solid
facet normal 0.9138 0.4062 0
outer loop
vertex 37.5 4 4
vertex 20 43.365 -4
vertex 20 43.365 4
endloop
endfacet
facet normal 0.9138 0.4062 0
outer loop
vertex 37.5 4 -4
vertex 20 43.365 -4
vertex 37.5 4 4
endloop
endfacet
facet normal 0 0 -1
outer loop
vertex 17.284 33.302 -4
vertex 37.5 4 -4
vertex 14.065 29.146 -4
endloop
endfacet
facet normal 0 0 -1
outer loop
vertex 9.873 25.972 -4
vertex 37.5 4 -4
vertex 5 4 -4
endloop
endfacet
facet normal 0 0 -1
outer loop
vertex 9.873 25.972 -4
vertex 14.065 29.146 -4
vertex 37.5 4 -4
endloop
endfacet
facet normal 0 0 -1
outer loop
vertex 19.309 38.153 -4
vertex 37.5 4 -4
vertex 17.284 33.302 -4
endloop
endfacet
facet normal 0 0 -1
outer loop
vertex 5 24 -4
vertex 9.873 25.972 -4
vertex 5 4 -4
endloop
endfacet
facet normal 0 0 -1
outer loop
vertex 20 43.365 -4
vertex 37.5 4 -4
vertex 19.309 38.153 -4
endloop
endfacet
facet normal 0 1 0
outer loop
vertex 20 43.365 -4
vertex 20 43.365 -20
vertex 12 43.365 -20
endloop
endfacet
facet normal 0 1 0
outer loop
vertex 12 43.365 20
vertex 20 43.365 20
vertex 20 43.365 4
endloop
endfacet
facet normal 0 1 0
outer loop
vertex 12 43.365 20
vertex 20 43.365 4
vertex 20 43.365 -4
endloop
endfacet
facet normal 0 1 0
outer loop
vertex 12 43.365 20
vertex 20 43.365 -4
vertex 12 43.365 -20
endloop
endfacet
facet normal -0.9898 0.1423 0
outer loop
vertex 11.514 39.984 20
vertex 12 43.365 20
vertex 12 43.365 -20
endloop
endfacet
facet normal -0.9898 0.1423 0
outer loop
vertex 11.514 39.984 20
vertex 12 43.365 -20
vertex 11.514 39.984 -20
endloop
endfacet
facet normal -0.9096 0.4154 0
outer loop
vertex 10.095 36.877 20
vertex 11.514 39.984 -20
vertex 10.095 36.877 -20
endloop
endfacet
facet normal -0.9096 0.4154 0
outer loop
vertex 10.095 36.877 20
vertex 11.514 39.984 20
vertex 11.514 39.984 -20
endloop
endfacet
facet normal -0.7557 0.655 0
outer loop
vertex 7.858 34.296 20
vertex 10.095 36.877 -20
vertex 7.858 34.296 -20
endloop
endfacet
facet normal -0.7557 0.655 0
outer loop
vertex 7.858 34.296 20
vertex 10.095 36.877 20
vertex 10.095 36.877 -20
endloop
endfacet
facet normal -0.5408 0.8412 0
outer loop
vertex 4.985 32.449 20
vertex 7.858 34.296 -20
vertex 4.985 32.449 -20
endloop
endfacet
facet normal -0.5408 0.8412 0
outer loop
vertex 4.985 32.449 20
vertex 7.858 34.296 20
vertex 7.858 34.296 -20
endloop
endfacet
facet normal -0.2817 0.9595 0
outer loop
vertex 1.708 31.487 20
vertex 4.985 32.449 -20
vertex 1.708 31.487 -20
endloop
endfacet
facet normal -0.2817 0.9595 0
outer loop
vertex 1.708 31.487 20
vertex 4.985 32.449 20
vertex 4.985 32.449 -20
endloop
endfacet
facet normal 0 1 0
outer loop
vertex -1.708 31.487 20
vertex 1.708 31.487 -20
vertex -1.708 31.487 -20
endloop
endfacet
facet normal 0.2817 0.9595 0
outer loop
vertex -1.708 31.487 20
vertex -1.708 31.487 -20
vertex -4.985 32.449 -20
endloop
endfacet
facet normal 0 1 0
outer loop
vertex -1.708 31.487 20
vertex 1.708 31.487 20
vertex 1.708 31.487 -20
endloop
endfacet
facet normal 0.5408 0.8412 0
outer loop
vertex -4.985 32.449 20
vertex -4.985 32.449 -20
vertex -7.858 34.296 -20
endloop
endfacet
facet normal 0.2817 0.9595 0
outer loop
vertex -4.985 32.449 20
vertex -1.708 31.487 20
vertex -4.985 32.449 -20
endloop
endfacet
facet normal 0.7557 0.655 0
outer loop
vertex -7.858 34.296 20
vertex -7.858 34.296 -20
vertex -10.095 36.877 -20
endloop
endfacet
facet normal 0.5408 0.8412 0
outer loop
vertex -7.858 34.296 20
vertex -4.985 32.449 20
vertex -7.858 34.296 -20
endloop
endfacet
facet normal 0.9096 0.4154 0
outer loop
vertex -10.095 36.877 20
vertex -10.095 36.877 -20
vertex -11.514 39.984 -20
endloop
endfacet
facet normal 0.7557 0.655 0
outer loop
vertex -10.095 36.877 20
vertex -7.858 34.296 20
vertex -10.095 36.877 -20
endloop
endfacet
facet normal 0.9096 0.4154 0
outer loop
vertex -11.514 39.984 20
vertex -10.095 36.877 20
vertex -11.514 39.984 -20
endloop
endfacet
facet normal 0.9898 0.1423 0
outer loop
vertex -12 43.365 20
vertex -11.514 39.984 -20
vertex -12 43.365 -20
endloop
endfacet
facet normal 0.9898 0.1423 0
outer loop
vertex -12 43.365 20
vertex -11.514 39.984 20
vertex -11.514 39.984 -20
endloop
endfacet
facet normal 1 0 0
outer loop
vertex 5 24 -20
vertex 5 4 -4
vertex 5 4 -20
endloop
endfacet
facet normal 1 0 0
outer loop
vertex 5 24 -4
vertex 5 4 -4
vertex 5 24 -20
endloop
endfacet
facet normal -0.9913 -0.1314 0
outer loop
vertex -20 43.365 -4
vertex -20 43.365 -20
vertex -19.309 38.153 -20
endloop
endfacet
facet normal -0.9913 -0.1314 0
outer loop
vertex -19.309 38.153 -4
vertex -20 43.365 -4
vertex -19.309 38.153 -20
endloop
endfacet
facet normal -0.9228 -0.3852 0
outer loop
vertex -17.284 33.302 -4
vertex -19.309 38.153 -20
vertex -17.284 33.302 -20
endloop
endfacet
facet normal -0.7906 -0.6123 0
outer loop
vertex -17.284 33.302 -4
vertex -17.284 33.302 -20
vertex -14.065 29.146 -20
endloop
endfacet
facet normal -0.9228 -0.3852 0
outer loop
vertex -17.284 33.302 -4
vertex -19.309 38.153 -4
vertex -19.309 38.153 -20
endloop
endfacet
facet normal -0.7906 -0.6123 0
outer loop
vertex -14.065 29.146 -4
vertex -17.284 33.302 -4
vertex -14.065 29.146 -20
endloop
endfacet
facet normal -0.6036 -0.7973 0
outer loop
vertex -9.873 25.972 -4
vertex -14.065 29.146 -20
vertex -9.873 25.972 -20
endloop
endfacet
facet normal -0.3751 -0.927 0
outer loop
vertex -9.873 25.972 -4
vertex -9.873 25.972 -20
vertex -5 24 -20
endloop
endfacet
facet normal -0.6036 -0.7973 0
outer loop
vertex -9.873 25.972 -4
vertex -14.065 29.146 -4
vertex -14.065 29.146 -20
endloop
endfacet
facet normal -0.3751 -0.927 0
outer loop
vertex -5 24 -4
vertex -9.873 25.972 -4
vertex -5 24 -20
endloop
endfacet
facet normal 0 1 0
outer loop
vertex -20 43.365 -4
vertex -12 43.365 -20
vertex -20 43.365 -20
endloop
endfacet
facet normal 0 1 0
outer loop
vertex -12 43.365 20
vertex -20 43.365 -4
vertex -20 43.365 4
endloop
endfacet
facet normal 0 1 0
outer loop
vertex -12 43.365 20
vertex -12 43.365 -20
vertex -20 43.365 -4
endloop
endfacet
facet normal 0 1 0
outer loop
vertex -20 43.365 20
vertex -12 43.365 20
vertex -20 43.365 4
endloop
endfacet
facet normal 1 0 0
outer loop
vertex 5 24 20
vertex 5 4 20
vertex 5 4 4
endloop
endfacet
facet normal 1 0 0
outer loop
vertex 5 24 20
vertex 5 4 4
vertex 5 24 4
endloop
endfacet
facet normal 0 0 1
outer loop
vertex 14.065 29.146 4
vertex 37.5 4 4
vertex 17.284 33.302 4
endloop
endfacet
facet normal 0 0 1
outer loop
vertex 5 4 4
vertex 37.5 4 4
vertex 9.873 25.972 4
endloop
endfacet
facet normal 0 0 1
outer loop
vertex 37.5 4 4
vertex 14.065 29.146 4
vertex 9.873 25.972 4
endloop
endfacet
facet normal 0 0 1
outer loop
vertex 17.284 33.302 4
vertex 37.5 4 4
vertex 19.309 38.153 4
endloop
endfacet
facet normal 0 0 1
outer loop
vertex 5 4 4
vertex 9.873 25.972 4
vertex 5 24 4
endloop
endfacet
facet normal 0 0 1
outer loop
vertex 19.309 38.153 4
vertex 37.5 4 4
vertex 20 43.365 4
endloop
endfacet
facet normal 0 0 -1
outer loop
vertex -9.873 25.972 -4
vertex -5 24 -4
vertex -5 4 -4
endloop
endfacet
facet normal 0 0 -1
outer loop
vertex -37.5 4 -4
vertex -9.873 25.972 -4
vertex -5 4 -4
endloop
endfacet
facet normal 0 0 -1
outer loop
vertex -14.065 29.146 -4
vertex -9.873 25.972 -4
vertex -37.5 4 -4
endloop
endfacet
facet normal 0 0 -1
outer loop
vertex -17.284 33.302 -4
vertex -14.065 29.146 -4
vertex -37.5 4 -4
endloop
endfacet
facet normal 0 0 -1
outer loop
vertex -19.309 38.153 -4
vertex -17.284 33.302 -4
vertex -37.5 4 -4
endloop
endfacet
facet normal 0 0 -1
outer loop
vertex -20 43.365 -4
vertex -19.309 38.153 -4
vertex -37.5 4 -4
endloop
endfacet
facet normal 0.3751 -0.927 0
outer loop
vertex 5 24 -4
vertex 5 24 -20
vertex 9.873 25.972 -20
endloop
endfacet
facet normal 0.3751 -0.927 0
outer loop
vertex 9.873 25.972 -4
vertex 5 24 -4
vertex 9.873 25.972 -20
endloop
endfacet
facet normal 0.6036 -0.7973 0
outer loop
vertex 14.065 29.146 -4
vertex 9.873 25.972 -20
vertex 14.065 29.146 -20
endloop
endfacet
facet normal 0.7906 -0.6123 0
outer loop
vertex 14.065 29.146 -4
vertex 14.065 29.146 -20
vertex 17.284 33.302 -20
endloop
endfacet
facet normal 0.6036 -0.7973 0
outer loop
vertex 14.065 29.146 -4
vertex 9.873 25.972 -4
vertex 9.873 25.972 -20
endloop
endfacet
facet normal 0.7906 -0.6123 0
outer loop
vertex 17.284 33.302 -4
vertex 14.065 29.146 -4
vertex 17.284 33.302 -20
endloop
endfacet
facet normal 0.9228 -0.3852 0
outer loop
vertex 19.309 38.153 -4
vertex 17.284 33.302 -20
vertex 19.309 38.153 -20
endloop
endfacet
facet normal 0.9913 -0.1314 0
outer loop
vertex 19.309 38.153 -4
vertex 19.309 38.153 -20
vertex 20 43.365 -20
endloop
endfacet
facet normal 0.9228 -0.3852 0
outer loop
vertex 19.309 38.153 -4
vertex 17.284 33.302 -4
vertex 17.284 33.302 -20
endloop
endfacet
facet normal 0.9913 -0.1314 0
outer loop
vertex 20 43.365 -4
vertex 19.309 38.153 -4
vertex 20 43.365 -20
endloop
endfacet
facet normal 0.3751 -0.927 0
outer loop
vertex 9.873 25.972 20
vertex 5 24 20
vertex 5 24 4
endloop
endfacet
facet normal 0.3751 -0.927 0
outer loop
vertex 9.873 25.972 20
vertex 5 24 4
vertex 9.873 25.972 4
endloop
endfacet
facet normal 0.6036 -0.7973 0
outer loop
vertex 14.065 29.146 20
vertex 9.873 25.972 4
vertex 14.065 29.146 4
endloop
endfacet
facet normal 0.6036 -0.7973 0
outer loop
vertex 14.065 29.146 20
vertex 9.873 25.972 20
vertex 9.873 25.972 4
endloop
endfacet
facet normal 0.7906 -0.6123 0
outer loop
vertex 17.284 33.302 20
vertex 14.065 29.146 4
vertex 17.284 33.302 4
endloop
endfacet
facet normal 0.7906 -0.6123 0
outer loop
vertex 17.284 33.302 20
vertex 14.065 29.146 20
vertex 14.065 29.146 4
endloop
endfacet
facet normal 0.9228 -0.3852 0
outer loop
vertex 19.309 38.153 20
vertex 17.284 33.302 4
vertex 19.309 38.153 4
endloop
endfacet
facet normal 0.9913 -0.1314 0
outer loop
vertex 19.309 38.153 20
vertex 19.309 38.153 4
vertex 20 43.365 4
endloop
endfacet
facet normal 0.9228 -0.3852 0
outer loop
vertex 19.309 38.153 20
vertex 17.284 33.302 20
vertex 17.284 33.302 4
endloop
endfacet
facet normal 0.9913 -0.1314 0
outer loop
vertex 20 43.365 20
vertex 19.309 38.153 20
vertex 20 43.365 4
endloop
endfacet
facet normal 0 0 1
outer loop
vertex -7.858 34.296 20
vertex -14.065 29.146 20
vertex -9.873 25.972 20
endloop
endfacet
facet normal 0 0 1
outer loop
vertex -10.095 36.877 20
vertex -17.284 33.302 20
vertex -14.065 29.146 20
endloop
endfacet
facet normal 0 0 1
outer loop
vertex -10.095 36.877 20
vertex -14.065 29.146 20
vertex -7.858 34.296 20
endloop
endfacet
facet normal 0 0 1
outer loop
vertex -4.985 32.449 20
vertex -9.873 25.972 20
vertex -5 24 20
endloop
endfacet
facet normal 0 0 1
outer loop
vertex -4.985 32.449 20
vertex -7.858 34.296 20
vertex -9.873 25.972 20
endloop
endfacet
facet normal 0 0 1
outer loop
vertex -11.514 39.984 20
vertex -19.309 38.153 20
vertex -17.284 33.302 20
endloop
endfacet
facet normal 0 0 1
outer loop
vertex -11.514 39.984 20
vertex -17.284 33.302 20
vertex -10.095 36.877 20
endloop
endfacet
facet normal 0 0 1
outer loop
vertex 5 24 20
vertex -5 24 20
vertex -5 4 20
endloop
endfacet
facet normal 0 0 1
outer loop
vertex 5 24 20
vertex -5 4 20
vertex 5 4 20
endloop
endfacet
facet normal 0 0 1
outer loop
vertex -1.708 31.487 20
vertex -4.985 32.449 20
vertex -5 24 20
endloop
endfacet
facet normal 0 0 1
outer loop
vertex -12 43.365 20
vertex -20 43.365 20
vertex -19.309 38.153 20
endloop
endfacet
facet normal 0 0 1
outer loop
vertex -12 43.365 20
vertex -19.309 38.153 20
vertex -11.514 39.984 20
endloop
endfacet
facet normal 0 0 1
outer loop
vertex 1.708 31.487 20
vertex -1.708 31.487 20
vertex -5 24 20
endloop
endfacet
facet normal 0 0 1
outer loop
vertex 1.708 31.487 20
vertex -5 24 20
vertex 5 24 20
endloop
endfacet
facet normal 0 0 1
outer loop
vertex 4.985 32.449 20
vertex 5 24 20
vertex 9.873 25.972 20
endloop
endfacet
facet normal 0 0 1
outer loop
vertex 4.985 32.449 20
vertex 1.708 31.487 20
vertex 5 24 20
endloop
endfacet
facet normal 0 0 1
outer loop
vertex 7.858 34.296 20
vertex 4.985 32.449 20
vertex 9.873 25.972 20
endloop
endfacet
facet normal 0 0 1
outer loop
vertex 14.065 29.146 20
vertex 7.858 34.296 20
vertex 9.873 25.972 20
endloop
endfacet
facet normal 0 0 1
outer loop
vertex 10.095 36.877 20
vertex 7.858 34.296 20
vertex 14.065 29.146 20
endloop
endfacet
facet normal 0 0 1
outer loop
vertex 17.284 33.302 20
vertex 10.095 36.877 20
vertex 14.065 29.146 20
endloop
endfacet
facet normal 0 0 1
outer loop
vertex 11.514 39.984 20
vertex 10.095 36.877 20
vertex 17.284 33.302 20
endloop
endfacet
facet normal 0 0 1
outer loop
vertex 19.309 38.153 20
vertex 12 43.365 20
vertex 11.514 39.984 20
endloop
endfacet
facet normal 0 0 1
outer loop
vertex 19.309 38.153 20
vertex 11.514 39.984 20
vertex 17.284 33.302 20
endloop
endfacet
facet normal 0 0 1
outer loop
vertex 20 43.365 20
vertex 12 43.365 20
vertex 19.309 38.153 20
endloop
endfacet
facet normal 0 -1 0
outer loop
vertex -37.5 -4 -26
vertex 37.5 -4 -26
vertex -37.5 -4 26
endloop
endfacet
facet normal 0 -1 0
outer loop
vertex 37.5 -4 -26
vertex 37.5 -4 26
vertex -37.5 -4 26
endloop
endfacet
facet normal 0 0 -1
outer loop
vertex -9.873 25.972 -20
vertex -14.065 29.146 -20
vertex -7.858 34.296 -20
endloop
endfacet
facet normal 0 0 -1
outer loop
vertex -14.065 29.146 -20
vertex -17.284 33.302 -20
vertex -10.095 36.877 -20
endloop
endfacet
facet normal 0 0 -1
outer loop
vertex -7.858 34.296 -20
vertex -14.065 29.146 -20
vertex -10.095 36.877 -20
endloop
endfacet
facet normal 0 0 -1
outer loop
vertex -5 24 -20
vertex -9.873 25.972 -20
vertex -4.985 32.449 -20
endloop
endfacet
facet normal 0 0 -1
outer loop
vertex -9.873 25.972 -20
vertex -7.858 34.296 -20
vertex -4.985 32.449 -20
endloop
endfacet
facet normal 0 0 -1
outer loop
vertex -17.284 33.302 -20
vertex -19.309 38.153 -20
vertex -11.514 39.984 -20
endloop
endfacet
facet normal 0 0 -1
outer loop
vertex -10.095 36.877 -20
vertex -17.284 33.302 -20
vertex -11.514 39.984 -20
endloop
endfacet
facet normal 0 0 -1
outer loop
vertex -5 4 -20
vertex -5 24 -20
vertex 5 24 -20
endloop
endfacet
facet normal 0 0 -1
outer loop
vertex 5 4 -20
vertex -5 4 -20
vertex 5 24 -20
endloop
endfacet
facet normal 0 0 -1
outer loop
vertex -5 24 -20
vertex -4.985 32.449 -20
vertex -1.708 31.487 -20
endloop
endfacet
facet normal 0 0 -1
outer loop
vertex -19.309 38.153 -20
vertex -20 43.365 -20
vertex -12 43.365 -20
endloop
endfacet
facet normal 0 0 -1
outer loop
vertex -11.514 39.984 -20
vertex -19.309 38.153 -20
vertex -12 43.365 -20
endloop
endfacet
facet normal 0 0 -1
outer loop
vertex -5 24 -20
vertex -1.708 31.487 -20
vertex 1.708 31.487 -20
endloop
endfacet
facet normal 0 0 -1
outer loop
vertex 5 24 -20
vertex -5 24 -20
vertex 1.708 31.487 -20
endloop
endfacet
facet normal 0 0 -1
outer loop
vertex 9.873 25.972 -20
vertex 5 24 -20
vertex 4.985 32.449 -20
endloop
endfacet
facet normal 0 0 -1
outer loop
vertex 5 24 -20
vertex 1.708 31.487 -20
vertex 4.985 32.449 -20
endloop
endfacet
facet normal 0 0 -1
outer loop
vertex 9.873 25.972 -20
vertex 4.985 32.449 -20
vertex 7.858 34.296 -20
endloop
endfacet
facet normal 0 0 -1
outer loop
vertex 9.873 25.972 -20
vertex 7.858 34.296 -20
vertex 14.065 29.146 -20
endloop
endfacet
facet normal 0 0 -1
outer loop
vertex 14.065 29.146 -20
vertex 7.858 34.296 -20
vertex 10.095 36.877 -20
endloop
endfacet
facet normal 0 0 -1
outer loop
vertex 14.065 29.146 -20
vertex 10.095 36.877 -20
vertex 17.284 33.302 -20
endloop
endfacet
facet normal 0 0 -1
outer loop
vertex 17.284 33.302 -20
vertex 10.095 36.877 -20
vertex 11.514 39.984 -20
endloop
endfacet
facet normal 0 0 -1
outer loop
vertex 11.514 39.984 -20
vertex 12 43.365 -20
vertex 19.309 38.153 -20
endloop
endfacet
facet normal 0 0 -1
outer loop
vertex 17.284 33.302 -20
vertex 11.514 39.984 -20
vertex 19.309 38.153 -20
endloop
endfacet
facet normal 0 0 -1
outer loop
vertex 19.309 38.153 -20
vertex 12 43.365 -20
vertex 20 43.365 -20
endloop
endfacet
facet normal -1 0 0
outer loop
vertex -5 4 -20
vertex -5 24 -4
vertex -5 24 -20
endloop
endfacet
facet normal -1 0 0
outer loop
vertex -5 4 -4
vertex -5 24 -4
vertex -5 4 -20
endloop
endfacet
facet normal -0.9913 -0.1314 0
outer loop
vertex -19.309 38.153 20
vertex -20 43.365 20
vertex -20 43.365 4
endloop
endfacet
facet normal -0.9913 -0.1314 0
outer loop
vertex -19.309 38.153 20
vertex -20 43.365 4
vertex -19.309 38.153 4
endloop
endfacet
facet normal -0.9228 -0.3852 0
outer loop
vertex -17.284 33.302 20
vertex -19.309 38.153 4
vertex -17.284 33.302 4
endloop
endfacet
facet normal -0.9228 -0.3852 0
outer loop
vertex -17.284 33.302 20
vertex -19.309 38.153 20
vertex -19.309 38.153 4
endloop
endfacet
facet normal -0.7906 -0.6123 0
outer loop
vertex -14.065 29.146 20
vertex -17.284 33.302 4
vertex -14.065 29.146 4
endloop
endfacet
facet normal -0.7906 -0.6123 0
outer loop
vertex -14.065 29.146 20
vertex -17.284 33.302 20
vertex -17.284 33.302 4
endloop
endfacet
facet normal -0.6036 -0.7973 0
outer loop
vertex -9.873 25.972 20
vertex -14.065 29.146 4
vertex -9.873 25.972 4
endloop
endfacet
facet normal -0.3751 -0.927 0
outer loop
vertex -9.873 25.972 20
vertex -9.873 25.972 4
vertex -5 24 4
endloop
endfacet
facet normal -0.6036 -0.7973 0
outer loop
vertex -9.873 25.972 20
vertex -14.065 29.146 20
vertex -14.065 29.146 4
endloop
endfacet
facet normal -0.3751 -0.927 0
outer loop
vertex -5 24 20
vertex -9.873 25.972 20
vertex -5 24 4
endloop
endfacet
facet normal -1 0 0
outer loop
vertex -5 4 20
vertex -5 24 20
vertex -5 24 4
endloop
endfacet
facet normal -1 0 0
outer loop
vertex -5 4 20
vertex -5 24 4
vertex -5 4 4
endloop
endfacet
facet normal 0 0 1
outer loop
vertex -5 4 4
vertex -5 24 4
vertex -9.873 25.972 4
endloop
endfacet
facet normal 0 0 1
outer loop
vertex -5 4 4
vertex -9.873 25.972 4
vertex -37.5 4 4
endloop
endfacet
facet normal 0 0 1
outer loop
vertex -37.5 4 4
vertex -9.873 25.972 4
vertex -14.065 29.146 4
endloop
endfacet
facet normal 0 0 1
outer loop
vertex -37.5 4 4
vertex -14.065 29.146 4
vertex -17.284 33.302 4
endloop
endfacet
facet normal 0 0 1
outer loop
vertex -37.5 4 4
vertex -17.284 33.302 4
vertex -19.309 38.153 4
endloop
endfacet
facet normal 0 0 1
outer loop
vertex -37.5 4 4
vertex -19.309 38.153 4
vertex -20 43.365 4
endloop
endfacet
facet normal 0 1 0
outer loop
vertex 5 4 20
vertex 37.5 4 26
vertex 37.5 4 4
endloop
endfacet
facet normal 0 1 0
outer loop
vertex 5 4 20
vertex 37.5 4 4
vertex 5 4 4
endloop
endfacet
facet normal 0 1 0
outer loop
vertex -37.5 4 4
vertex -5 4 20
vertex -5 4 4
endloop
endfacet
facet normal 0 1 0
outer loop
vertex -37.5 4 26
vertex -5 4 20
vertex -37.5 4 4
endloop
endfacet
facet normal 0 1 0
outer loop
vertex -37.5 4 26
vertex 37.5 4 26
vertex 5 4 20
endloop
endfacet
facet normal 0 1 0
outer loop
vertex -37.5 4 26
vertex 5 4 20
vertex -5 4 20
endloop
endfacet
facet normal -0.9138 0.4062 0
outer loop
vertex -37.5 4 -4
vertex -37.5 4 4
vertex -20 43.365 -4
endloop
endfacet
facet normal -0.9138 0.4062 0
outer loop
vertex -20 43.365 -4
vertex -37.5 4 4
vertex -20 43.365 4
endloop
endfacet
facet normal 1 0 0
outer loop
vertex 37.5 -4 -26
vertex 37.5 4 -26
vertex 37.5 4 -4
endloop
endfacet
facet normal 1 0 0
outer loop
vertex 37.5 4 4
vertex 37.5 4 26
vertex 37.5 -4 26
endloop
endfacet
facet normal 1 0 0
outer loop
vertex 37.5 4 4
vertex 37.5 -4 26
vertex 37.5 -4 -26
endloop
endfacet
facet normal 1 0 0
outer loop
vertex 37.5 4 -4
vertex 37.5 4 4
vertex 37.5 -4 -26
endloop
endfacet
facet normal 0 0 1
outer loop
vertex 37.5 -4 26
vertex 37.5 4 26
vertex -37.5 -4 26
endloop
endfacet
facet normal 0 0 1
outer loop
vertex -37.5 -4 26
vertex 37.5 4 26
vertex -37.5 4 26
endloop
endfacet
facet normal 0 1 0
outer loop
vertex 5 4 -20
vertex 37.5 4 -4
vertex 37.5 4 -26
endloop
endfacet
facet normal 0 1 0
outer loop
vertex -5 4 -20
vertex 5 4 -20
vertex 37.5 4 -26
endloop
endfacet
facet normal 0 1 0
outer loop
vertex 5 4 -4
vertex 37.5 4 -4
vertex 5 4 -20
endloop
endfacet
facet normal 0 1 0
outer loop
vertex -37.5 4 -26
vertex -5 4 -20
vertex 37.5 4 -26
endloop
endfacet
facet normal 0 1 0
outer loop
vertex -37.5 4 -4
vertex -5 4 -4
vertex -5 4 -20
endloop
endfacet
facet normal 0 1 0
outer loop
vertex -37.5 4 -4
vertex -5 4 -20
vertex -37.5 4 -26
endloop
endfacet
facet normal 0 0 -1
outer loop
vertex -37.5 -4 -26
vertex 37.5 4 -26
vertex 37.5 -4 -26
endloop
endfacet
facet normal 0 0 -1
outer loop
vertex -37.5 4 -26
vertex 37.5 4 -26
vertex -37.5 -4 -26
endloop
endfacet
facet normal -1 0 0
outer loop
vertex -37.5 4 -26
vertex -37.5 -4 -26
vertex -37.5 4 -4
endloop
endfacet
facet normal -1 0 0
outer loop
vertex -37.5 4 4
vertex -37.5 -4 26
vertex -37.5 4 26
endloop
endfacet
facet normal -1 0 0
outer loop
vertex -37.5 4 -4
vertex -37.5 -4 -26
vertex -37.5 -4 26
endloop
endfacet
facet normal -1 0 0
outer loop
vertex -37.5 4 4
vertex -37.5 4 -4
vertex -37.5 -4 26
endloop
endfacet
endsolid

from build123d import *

# Parameters (mm, degrees)
BOSS_EXTRUDE1_DEPTH = 26
BOSS_EXTRUDE3_DEPTH = 20
BOSS_EXTRUDE4_DEPTH = 4


with BuildPart() as part:
    # Sketch2 → Boss-Extrude1 (new, symmetric)
    with BuildSketch(Plane.XY):
        Polygon((5, 4), (-5, 4), (-37.5, 4), (-37.5, -4), (37.5, -4), (37.5, 4), align=None)
    extrude(amount=BOSS_EXTRUDE1_DEPTH, both=True)

    # Sketch2<4> → Boss-Extrude3 (add, symmetric)
    with BuildSketch(Plane.XY):
        with BuildLine():
            Line((-5, 24), (-5, 4))
            Line((-5, 4), (5, 4))
            Line((5, 4), (5, 24))
            ThreePointArc((5, 24), (15.811388301, 31.117468017), (20, 43.364916731))
            Line((20, 43.364916731), (12, 43.364916731))
            ThreePointArc((12, 43.364916731), (0, 31.364916731), (-12, 43.364916731))
            Line((-12, 43.364916731), (-20, 43.364916731))
            ThreePointArc((-20, 43.364916731), (-15.811388301, 31.117468017), (-5, 24))
        make_face()
    extrude(amount=BOSS_EXTRUDE3_DEPTH, both=True)

    # Sketch2<6> → Boss-Extrude4 (add, symmetric)
    with BuildSketch(Plane.XY):
        with BuildLine():
            Line((-37.5, 4), (-5, 4))
            Line((-5, 4), (-5, 24))
            ThreePointArc((-5, 24), (-15.811388301, 31.117468017), (-20, 43.364916731))
            Line((-20, 43.364916731), (-37.5, 4))
        make_face()
        with BuildLine():
            Line((5, 24), (5, 4))
            Line((5, 4), (37.5, 4))
            Line((37.5, 4), (20, 43.364916731))
            ThreePointArc((20, 43.364916731), (15.811388301, 31.117468017), (5, 24))
        make_face()
    extrude(amount=BOSS_EXTRUDE4_DEPTH, both=True)


solid = part.part
